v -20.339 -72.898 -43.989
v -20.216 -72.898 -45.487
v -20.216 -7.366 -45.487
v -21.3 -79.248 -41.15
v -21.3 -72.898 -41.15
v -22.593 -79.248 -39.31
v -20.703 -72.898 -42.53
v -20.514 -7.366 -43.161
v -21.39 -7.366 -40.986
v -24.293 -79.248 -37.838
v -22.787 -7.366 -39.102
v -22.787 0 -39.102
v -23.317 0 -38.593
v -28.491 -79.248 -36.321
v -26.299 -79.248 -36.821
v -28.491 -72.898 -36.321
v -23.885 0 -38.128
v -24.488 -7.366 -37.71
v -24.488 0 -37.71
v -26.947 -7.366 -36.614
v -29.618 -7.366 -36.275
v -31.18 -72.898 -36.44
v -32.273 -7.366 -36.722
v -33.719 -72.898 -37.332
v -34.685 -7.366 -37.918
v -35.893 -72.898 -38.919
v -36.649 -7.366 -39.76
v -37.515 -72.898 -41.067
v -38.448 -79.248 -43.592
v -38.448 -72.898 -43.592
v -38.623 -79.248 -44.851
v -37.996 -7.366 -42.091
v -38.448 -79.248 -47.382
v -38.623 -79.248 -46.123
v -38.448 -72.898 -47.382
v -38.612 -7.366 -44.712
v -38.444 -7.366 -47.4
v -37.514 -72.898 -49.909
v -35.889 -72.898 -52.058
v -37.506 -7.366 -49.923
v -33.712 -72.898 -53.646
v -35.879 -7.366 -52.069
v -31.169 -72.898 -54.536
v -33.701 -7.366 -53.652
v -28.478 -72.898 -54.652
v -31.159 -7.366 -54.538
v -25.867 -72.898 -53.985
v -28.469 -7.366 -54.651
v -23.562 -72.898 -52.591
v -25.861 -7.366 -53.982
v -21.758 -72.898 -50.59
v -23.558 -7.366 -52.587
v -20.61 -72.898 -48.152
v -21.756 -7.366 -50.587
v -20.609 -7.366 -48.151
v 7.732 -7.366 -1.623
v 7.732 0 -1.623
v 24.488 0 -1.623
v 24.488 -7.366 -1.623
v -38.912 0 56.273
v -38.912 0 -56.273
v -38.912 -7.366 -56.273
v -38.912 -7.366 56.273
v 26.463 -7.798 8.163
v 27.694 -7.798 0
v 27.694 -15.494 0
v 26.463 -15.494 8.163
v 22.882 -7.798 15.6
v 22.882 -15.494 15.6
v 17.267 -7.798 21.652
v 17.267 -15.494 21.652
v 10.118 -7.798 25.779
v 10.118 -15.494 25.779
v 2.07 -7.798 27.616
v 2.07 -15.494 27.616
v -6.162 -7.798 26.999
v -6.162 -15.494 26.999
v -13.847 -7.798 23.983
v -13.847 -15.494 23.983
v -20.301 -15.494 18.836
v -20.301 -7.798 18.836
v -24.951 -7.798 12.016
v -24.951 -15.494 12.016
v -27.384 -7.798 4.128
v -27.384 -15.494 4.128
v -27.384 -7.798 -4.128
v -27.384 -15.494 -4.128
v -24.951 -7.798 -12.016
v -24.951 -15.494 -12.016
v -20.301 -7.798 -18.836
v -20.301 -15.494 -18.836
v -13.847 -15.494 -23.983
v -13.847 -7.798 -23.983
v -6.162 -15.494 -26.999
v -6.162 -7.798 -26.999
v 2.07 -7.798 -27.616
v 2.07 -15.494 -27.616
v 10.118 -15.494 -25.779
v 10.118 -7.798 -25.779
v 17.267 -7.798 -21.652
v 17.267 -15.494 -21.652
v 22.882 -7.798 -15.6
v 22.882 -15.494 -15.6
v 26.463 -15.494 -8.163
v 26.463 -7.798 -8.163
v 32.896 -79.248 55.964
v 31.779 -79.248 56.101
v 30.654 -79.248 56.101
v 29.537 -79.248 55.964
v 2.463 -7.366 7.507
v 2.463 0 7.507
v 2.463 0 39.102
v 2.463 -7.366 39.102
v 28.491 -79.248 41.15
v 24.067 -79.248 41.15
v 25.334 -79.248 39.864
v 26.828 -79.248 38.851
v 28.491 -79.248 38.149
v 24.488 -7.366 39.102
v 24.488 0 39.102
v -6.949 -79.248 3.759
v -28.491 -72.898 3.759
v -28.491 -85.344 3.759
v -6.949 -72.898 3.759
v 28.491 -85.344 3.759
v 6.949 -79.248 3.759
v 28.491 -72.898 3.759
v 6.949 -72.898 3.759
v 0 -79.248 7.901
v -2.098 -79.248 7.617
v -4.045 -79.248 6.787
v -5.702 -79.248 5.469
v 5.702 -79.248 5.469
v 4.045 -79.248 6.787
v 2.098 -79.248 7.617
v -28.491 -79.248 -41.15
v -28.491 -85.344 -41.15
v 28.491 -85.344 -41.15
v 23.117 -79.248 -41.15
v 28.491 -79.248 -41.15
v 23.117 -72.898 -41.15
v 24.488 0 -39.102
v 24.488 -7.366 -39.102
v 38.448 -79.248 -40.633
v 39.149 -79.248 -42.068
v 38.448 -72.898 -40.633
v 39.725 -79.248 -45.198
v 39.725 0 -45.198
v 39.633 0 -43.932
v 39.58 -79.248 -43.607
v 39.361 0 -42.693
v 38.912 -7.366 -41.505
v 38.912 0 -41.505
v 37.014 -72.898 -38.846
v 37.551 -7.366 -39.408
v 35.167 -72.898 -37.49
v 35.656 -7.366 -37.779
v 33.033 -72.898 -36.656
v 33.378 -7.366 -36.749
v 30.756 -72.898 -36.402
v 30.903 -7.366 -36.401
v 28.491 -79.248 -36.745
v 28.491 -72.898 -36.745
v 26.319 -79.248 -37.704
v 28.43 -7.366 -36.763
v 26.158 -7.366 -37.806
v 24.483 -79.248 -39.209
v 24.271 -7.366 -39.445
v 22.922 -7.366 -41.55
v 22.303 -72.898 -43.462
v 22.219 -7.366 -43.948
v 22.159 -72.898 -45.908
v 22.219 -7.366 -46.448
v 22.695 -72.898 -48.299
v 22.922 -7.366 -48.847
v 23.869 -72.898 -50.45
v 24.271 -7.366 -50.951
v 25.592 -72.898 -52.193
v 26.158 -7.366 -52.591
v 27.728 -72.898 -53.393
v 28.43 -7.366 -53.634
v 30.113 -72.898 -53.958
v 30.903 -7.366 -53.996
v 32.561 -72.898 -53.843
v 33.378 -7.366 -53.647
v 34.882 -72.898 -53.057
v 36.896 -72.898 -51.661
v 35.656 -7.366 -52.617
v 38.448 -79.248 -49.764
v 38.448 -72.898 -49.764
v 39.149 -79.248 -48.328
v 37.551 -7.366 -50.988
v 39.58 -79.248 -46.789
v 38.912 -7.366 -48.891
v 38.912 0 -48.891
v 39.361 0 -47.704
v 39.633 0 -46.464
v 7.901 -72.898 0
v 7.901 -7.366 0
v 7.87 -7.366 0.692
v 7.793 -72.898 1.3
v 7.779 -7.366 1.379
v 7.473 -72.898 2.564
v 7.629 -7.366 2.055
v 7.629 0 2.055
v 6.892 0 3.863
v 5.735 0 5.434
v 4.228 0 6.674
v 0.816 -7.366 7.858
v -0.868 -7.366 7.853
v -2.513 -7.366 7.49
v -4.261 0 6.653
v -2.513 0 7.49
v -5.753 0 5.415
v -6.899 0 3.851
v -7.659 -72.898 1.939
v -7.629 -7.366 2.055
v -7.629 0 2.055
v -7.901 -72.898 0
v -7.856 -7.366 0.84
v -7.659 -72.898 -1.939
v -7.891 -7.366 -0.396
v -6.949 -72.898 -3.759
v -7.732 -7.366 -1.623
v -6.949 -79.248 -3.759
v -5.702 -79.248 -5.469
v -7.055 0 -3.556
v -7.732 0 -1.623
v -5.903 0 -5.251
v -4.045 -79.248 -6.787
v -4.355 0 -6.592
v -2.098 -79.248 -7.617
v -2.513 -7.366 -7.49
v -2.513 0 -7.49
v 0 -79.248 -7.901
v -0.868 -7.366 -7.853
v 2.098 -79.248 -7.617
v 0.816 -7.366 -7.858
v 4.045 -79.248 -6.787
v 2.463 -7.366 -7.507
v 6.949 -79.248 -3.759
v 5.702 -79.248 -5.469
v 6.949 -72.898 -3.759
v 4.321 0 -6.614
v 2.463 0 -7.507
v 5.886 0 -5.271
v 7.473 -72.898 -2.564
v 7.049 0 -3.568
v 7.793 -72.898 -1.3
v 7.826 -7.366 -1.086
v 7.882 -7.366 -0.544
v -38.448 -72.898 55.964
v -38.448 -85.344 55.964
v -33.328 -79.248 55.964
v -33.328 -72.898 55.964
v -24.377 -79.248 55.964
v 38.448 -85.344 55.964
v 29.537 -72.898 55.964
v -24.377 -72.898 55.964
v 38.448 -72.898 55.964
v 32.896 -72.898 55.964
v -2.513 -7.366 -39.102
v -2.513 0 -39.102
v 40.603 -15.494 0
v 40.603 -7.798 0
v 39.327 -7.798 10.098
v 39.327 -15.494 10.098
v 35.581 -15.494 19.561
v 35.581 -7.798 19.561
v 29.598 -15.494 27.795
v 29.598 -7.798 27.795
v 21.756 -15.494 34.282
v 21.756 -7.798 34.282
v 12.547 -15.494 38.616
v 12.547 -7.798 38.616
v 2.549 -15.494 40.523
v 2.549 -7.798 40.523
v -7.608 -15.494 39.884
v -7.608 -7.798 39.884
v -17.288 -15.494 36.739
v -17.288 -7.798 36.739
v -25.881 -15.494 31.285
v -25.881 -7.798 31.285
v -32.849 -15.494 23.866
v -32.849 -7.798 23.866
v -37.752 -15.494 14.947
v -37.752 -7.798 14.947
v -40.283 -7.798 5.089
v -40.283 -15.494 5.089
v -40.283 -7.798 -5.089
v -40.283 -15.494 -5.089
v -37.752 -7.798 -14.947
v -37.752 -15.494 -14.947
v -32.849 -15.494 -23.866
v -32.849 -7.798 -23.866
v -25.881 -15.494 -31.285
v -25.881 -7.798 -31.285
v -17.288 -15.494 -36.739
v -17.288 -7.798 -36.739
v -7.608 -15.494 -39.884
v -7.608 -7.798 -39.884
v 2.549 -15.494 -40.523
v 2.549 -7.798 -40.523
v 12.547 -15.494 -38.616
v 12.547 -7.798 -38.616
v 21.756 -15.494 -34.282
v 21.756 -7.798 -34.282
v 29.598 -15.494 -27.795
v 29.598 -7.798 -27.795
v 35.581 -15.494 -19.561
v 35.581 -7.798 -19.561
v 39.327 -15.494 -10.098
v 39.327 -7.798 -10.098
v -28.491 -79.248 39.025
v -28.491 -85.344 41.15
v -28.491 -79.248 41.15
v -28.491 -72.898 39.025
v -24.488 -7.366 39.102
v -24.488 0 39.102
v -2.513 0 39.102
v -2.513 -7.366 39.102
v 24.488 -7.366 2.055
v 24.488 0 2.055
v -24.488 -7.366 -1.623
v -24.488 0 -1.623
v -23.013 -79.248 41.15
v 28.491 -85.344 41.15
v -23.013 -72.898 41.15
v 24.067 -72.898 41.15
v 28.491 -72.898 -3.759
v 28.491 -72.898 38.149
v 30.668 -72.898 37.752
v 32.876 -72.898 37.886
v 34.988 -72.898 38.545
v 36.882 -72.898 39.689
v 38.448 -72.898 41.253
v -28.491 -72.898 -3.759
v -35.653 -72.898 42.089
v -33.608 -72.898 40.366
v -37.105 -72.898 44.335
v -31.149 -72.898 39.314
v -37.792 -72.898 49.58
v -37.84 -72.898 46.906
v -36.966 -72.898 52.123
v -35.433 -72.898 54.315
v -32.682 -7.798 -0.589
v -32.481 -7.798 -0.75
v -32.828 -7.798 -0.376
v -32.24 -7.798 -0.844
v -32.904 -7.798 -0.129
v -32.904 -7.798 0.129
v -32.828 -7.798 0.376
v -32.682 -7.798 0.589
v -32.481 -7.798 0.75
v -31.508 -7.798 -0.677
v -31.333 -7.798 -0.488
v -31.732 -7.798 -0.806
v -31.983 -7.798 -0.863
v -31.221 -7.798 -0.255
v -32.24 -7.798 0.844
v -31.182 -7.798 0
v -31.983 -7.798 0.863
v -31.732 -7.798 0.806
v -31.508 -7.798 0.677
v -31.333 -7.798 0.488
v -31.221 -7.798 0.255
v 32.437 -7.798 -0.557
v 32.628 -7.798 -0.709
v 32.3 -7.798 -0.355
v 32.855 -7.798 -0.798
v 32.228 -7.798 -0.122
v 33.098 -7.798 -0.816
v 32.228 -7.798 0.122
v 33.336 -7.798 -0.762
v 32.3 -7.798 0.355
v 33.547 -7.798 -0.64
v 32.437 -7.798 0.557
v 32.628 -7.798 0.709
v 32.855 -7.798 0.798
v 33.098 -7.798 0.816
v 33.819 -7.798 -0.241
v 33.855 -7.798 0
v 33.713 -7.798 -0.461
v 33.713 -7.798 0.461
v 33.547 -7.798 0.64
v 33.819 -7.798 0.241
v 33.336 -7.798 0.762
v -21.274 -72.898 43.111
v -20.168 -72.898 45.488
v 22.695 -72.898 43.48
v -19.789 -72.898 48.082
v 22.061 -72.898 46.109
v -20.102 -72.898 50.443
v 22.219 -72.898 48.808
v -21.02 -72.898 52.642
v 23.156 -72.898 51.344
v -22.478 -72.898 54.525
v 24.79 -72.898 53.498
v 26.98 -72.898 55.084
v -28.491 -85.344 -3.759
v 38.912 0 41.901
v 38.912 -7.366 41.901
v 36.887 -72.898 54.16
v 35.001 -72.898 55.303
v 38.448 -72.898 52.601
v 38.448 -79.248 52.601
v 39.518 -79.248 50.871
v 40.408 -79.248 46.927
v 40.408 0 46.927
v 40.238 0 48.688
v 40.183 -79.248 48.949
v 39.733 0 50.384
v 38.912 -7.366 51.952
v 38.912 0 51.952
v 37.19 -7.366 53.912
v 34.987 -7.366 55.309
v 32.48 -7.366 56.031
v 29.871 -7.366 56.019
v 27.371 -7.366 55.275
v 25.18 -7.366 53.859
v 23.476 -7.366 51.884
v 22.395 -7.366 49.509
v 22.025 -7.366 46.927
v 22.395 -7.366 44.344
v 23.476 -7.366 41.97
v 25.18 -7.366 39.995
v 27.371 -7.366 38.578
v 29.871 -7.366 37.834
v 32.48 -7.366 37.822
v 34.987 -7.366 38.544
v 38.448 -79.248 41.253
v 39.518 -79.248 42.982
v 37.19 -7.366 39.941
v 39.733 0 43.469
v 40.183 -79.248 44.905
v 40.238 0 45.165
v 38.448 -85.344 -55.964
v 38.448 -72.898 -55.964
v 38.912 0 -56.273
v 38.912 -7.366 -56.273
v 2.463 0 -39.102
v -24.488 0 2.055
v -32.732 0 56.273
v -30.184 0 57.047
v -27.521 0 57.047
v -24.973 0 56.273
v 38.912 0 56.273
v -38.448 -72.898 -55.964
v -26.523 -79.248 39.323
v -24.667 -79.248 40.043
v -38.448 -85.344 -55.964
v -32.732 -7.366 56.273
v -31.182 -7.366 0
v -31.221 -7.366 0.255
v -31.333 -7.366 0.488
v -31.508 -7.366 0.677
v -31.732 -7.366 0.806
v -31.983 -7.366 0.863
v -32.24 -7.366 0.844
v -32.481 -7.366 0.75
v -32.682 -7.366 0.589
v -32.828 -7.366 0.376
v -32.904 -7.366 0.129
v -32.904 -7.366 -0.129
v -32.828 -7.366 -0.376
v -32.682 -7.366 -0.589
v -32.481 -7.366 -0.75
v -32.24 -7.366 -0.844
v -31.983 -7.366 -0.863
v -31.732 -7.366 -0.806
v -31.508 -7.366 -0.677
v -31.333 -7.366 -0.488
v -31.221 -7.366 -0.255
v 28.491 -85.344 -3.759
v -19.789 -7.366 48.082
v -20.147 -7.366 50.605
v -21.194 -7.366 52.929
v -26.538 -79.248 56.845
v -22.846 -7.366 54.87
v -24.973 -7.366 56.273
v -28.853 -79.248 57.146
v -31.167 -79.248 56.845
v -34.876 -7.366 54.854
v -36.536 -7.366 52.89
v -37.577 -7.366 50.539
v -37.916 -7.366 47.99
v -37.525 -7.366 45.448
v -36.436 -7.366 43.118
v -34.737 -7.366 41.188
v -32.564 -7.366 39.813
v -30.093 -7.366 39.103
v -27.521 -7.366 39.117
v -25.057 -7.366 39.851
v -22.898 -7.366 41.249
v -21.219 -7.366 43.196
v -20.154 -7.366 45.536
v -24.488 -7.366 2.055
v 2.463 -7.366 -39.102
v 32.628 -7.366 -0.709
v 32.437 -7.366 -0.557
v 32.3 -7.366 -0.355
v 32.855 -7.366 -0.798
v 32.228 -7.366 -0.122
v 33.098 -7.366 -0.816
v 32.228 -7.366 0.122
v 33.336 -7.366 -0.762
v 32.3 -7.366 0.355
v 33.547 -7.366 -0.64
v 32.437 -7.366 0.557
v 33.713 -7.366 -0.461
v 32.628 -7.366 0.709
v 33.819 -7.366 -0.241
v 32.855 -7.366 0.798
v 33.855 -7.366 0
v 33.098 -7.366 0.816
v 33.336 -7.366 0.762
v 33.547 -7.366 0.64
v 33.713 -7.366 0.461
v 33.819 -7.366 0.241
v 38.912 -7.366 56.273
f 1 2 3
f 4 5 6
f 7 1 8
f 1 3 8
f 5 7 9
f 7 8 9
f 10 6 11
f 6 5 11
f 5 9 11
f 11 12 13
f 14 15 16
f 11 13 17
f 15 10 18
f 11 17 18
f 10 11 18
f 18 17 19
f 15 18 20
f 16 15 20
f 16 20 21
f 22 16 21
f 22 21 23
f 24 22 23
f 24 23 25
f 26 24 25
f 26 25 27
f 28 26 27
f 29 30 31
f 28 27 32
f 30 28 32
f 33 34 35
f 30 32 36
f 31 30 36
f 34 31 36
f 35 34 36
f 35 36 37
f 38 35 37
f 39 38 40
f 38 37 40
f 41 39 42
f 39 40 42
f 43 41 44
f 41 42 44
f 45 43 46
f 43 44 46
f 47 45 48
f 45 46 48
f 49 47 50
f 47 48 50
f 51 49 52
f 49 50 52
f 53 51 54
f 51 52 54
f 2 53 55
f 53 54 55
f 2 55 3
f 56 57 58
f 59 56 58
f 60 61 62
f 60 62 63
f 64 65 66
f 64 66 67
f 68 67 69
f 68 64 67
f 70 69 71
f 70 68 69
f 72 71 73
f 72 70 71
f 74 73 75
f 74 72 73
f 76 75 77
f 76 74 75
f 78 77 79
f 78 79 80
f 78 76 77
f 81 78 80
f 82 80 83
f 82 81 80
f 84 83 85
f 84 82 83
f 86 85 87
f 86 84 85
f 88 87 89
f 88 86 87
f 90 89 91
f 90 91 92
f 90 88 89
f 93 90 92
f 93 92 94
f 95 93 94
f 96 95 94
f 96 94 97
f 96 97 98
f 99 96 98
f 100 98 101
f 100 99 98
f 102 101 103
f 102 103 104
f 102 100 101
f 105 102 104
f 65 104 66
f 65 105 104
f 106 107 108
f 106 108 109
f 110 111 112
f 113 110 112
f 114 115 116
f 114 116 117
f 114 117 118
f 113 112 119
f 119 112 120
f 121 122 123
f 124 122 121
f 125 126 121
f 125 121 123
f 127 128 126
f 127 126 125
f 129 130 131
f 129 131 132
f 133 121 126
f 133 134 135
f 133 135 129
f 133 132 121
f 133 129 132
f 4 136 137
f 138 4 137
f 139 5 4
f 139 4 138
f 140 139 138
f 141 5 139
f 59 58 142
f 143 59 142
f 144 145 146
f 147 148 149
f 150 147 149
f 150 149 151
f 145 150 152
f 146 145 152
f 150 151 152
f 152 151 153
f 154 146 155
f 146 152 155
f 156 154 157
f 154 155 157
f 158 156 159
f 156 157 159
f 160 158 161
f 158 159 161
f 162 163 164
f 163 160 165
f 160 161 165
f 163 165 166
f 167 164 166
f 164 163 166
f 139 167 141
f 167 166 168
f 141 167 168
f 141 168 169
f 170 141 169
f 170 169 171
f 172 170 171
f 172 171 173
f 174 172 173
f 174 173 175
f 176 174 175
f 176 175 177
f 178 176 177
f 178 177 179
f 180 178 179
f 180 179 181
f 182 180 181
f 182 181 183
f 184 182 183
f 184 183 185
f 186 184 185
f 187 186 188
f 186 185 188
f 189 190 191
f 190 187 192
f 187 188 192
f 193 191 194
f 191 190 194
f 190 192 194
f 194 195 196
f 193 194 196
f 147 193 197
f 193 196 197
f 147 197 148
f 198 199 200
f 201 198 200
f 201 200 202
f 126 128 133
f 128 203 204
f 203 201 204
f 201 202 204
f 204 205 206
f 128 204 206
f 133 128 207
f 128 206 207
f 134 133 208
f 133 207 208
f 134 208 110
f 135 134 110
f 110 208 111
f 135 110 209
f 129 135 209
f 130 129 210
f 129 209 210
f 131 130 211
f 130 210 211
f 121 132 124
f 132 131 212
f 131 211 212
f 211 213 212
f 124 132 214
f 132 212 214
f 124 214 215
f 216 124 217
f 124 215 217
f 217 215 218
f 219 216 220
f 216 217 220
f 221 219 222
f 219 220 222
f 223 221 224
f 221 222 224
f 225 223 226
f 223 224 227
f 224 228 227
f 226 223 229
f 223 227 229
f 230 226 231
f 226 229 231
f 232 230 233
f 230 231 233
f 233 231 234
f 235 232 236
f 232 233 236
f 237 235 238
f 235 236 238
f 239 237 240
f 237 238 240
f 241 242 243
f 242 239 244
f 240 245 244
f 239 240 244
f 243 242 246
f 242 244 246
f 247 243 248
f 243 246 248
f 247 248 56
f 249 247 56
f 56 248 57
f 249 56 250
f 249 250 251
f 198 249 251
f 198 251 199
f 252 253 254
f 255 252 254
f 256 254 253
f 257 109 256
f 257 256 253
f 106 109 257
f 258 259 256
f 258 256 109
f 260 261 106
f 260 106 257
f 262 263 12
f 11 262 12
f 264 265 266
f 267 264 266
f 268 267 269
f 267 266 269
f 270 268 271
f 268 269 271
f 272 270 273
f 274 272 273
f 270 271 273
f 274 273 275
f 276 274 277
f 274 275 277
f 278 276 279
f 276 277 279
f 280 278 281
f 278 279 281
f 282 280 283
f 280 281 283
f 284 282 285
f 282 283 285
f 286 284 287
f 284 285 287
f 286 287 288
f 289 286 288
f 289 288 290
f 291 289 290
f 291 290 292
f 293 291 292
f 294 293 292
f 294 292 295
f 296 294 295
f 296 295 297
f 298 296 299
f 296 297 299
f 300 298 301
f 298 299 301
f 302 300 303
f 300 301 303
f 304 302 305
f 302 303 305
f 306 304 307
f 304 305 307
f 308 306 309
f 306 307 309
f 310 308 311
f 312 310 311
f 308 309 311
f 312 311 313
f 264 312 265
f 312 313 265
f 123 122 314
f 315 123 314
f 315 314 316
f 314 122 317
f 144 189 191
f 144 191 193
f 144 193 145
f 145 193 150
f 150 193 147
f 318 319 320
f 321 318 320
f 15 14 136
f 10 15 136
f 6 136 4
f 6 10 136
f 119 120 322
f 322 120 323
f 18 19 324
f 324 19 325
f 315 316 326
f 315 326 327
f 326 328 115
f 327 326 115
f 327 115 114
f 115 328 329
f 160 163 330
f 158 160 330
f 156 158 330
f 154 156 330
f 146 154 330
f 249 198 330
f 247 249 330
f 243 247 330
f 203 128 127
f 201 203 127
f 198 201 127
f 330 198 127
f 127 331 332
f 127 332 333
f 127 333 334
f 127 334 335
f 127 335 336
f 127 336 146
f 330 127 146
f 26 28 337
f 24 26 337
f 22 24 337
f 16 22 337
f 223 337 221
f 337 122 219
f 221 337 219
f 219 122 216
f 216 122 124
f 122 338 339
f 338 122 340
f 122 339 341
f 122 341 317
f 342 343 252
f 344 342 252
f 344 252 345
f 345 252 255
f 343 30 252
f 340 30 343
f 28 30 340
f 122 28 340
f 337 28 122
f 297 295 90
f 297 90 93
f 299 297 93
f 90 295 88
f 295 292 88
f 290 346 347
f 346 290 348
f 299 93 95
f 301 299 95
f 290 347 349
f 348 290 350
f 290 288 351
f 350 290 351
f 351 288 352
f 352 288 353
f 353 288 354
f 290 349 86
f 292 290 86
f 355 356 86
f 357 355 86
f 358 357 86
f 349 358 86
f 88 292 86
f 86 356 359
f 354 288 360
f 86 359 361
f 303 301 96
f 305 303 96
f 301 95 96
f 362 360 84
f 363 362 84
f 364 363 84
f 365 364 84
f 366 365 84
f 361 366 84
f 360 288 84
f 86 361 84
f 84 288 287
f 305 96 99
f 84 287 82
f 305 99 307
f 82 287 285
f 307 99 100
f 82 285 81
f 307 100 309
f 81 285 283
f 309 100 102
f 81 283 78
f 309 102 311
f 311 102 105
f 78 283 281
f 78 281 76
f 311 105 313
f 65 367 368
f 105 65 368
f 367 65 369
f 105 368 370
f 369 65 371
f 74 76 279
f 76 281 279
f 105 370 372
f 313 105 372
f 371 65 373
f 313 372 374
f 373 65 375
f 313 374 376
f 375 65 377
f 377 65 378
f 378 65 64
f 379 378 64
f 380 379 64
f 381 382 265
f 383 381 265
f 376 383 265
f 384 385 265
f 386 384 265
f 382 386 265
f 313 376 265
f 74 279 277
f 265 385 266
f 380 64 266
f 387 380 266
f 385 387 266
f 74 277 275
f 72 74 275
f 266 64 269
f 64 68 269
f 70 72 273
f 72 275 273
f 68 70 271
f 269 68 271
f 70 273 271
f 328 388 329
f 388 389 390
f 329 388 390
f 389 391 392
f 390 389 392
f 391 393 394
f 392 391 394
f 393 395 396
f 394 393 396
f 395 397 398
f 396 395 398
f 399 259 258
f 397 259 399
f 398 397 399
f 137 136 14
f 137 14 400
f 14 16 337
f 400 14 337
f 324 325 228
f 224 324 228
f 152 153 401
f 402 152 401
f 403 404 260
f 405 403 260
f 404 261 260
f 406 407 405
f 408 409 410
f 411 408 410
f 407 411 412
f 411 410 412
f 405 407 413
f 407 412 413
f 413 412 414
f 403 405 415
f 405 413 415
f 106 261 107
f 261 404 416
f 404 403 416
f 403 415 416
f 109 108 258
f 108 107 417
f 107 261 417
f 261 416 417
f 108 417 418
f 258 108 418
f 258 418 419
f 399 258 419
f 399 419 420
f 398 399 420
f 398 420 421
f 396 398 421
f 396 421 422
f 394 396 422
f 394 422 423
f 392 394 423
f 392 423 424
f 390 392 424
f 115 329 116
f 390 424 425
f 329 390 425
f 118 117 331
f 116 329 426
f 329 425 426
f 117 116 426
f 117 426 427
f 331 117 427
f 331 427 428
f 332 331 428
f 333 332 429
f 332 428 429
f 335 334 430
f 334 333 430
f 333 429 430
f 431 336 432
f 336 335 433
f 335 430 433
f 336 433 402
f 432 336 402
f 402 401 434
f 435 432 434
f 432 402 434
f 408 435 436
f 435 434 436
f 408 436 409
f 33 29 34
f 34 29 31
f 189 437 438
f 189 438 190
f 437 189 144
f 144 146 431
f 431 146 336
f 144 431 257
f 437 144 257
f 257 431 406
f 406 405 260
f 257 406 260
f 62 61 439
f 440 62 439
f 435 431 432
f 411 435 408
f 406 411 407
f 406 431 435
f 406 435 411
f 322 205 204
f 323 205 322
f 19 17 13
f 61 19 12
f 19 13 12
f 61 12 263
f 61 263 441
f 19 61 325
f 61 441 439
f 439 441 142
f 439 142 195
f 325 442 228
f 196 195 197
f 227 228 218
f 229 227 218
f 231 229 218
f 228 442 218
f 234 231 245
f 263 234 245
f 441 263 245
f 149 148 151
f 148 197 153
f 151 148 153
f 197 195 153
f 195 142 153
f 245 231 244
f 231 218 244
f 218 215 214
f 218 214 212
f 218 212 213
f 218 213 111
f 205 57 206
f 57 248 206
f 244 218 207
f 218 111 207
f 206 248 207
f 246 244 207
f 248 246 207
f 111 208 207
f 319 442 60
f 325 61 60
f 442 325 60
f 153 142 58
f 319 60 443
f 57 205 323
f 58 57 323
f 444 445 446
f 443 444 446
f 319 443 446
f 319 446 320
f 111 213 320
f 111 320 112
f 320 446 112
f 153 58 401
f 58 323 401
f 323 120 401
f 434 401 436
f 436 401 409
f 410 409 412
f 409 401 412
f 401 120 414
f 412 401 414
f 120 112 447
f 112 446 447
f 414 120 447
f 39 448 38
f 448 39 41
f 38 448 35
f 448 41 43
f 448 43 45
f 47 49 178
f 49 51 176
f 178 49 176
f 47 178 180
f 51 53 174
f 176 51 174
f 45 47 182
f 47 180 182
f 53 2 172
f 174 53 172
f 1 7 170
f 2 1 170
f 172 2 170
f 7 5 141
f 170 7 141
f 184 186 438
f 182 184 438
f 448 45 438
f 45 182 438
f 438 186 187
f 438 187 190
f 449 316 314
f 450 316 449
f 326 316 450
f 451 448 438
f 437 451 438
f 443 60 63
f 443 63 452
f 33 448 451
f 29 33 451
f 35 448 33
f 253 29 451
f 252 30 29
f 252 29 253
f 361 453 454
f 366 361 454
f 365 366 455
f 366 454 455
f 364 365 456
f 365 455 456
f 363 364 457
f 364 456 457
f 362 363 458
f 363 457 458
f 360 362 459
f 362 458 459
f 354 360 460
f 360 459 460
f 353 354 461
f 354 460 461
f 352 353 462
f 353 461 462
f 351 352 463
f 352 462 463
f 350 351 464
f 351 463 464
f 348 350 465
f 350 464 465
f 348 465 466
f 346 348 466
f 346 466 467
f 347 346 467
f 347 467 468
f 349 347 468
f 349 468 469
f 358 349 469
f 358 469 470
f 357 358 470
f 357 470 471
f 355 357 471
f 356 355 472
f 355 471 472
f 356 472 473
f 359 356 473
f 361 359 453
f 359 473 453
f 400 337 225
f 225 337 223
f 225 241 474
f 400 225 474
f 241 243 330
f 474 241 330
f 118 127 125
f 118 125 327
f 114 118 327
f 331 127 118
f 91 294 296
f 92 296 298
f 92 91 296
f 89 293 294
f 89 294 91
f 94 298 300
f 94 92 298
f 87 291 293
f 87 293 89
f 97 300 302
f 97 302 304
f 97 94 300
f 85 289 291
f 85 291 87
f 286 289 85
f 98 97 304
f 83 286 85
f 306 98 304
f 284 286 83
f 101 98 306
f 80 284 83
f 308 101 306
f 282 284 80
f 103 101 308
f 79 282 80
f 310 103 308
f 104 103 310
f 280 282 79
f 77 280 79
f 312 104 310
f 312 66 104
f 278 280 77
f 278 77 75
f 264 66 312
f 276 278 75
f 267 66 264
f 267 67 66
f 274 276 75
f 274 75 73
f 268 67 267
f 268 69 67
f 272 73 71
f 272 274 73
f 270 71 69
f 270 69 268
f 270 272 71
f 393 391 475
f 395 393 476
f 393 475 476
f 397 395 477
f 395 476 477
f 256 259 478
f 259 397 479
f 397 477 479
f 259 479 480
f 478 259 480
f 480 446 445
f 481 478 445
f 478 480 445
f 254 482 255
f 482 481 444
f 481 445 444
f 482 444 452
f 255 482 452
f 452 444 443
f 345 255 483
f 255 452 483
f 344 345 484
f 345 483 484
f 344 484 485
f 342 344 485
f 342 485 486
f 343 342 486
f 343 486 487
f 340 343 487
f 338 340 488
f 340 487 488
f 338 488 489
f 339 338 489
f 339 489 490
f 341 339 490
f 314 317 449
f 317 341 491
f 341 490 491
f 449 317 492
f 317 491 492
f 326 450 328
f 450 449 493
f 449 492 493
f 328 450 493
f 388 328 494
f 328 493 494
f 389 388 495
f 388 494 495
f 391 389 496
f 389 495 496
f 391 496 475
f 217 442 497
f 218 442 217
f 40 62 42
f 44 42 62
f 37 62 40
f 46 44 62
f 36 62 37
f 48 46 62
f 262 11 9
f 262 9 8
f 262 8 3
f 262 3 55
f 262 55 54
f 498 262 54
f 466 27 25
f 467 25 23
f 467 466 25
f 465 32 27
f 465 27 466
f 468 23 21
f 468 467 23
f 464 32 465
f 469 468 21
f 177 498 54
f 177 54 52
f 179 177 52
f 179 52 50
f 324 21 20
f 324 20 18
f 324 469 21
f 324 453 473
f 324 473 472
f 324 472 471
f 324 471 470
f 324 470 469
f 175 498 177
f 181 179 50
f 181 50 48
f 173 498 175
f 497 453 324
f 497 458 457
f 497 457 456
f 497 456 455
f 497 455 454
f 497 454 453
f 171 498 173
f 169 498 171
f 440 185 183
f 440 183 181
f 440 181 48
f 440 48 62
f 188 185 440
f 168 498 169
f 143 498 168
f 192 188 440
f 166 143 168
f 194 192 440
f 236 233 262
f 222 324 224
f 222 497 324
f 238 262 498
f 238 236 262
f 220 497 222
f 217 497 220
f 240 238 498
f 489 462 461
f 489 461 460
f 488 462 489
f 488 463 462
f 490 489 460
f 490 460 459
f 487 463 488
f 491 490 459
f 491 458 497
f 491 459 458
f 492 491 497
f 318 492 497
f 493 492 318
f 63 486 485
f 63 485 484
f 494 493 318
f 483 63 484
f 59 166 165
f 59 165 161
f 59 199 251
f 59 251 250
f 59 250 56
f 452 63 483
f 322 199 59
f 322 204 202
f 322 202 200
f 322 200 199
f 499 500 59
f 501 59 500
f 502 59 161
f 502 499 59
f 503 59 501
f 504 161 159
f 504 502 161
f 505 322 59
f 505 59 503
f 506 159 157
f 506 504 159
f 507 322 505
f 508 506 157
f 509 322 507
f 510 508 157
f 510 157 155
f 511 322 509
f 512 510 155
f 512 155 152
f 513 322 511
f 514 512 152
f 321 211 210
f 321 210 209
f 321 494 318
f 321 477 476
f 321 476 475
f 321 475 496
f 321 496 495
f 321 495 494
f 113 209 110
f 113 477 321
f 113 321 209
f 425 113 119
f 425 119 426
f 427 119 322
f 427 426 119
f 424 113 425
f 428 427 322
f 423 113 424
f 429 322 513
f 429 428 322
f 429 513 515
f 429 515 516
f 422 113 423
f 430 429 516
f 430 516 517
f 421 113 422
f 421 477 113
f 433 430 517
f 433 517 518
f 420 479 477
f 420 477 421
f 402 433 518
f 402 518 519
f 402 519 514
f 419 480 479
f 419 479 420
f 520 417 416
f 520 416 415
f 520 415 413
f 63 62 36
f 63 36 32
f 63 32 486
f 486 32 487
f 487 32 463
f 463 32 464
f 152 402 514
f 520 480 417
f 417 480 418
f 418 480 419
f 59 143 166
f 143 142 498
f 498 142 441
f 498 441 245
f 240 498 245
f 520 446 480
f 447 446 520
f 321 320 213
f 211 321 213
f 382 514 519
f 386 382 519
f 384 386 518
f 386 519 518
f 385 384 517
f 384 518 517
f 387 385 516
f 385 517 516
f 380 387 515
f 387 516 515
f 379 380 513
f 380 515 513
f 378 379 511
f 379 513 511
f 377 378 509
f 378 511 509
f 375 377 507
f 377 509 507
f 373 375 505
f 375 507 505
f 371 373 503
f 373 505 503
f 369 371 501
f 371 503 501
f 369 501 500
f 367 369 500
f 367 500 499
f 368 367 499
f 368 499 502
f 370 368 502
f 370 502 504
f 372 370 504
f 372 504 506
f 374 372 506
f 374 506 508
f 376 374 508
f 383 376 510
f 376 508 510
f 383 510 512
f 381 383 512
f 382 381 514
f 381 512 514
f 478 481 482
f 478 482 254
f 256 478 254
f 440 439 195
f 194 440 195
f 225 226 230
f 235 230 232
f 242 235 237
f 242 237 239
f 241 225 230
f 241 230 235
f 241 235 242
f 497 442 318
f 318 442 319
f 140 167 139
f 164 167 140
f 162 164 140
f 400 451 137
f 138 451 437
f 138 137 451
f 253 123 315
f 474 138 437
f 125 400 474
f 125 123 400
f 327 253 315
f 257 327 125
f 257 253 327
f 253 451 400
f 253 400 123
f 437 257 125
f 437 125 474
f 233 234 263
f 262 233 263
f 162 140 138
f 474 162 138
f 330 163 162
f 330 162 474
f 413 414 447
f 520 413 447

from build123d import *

# Parameters (mm, degrees)
F0_W     = 77.8246372938
F0_H     = 112.5469133258
F0_W_2   = 21.9748611562
F0_H_2   = 3.6779557122
F0_W_3   = 22.0251933206
F1_DEPTH = 7.366
F2_R     = 7.9006710882
F2_R_2   = 9.1916040088
F2_R_3   = 9.0636867771
F2_R_4   = 8.7975277967
F2_R_5   = 9.2142672279
F3_DEPTH = 79.248
F4_R     = 0.8182750857
F4_R_2   = 0.8655541006
F5_DEPTH = 7.8486
F7_START = 7.7978
F6_R     = 40.6030276707
F6_R_2   = 27.6936887415
F7_DEPTH = 7.6962
F9_START = 72.898
F8_W     = 76.8951624632
F8_H     = 111.9272559881
F8_W_2   = 56.9818727672
F8_H_2   = 37.3910360504
F9_DEPTH = 12.446


with BuildPart() as f1:
    # F0 (on Front) → F1 (new body)
    with BuildSketch(Plane.XZ):
        Rectangle(F0_W, F0_H)
        Polygon((-2.5131949224, -39.1017198563), (-24.4880560786, -39.1017198563), (-24.4880560786, -1.622540527), (-24.4880560786, 2.0554151852), (-24.4880560786, 39.1017198563), (-2.5131949224, 39.1017198563), (2.462862758, 39.1017198563), (24.4880560786, 39.1017198563), (24.4880560786, 2.0554151852), (24.4880560786, -1.622540527), (24.4880560786, -39.1017198563), (2.462862758, -39.1017198563), align=None, mode=Mode.SUBTRACT)
        with Locations((-13.5006255005, 0.2164373291)):
            Rectangle(F0_W_2, F0_H_2)
        with Locations((13.4754594183, 0.2164373291)):
            Rectangle(F0_W_3, F0_H_2)
        Polygon((-2.5131949224, -1.622540527), (-2.5131949224, -39.1017198563), (2.462862758, -39.1017198563), (2.462862758, -1.622540527), (2.462862758, 2.0554151852), (2.462862758, 39.1017198563), (-2.5131949224, 39.1017198563), (-2.5131949224, 2.0554151852), align=None)
    extrude(amount=F1_DEPTH)

    # F2 (on Front) → F3 (join)
    with BuildSketch(Plane.XZ):
        Circle(F2_R)
        with Locations((31.2162749469, 46.9267778099)):
            Circle(F2_R_2)
        with Locations((-28.8526788354, 48.0819493532)):
            Circle(F2_R_3)
        with Locations((30.9274848551, -45.1982095838)):
            Circle(F2_R_4)
        with Locations((-29.4302646071, -45.4870015383)):
            Circle(F2_R_5)
    extrude(amount=F3_DEPTH)

    # F4 (on Front) → F5 (join)
    with BuildSketch(Plane.XZ):
        with Locations((33.0372042954, 0)):
            Circle(F4_R)
        with Locations((-32.0478864014, 0)):
            Circle(F4_R_2)
    extrude(amount=F5_DEPTH)

    # F6 (on Front) → F7 (join)
    with BuildSketch(Plane.XZ.offset(F7_START)):
        Circle(F6_R)
        Circle(F6_R_2, mode=Mode.SUBTRACT)
    extrude(amount=F7_DEPTH)

    # F8 (on Front) → F9 (join)
    with BuildSketch(Plane.XZ.offset(F9_START)):
        Rectangle(F8_W, F8_H)
        with Locations((0, -22.4545601523)):
            Rectangle(F8_W_2, F8_H_2, mode=Mode.SUBTRACT)
        with Locations((0, 22.4545601523)):
            Rectangle(F8_W_2, F8_H_2, mode=Mode.SUBTRACT)
    extrude(amount=F9_DEPTH)


solid = f1.part
